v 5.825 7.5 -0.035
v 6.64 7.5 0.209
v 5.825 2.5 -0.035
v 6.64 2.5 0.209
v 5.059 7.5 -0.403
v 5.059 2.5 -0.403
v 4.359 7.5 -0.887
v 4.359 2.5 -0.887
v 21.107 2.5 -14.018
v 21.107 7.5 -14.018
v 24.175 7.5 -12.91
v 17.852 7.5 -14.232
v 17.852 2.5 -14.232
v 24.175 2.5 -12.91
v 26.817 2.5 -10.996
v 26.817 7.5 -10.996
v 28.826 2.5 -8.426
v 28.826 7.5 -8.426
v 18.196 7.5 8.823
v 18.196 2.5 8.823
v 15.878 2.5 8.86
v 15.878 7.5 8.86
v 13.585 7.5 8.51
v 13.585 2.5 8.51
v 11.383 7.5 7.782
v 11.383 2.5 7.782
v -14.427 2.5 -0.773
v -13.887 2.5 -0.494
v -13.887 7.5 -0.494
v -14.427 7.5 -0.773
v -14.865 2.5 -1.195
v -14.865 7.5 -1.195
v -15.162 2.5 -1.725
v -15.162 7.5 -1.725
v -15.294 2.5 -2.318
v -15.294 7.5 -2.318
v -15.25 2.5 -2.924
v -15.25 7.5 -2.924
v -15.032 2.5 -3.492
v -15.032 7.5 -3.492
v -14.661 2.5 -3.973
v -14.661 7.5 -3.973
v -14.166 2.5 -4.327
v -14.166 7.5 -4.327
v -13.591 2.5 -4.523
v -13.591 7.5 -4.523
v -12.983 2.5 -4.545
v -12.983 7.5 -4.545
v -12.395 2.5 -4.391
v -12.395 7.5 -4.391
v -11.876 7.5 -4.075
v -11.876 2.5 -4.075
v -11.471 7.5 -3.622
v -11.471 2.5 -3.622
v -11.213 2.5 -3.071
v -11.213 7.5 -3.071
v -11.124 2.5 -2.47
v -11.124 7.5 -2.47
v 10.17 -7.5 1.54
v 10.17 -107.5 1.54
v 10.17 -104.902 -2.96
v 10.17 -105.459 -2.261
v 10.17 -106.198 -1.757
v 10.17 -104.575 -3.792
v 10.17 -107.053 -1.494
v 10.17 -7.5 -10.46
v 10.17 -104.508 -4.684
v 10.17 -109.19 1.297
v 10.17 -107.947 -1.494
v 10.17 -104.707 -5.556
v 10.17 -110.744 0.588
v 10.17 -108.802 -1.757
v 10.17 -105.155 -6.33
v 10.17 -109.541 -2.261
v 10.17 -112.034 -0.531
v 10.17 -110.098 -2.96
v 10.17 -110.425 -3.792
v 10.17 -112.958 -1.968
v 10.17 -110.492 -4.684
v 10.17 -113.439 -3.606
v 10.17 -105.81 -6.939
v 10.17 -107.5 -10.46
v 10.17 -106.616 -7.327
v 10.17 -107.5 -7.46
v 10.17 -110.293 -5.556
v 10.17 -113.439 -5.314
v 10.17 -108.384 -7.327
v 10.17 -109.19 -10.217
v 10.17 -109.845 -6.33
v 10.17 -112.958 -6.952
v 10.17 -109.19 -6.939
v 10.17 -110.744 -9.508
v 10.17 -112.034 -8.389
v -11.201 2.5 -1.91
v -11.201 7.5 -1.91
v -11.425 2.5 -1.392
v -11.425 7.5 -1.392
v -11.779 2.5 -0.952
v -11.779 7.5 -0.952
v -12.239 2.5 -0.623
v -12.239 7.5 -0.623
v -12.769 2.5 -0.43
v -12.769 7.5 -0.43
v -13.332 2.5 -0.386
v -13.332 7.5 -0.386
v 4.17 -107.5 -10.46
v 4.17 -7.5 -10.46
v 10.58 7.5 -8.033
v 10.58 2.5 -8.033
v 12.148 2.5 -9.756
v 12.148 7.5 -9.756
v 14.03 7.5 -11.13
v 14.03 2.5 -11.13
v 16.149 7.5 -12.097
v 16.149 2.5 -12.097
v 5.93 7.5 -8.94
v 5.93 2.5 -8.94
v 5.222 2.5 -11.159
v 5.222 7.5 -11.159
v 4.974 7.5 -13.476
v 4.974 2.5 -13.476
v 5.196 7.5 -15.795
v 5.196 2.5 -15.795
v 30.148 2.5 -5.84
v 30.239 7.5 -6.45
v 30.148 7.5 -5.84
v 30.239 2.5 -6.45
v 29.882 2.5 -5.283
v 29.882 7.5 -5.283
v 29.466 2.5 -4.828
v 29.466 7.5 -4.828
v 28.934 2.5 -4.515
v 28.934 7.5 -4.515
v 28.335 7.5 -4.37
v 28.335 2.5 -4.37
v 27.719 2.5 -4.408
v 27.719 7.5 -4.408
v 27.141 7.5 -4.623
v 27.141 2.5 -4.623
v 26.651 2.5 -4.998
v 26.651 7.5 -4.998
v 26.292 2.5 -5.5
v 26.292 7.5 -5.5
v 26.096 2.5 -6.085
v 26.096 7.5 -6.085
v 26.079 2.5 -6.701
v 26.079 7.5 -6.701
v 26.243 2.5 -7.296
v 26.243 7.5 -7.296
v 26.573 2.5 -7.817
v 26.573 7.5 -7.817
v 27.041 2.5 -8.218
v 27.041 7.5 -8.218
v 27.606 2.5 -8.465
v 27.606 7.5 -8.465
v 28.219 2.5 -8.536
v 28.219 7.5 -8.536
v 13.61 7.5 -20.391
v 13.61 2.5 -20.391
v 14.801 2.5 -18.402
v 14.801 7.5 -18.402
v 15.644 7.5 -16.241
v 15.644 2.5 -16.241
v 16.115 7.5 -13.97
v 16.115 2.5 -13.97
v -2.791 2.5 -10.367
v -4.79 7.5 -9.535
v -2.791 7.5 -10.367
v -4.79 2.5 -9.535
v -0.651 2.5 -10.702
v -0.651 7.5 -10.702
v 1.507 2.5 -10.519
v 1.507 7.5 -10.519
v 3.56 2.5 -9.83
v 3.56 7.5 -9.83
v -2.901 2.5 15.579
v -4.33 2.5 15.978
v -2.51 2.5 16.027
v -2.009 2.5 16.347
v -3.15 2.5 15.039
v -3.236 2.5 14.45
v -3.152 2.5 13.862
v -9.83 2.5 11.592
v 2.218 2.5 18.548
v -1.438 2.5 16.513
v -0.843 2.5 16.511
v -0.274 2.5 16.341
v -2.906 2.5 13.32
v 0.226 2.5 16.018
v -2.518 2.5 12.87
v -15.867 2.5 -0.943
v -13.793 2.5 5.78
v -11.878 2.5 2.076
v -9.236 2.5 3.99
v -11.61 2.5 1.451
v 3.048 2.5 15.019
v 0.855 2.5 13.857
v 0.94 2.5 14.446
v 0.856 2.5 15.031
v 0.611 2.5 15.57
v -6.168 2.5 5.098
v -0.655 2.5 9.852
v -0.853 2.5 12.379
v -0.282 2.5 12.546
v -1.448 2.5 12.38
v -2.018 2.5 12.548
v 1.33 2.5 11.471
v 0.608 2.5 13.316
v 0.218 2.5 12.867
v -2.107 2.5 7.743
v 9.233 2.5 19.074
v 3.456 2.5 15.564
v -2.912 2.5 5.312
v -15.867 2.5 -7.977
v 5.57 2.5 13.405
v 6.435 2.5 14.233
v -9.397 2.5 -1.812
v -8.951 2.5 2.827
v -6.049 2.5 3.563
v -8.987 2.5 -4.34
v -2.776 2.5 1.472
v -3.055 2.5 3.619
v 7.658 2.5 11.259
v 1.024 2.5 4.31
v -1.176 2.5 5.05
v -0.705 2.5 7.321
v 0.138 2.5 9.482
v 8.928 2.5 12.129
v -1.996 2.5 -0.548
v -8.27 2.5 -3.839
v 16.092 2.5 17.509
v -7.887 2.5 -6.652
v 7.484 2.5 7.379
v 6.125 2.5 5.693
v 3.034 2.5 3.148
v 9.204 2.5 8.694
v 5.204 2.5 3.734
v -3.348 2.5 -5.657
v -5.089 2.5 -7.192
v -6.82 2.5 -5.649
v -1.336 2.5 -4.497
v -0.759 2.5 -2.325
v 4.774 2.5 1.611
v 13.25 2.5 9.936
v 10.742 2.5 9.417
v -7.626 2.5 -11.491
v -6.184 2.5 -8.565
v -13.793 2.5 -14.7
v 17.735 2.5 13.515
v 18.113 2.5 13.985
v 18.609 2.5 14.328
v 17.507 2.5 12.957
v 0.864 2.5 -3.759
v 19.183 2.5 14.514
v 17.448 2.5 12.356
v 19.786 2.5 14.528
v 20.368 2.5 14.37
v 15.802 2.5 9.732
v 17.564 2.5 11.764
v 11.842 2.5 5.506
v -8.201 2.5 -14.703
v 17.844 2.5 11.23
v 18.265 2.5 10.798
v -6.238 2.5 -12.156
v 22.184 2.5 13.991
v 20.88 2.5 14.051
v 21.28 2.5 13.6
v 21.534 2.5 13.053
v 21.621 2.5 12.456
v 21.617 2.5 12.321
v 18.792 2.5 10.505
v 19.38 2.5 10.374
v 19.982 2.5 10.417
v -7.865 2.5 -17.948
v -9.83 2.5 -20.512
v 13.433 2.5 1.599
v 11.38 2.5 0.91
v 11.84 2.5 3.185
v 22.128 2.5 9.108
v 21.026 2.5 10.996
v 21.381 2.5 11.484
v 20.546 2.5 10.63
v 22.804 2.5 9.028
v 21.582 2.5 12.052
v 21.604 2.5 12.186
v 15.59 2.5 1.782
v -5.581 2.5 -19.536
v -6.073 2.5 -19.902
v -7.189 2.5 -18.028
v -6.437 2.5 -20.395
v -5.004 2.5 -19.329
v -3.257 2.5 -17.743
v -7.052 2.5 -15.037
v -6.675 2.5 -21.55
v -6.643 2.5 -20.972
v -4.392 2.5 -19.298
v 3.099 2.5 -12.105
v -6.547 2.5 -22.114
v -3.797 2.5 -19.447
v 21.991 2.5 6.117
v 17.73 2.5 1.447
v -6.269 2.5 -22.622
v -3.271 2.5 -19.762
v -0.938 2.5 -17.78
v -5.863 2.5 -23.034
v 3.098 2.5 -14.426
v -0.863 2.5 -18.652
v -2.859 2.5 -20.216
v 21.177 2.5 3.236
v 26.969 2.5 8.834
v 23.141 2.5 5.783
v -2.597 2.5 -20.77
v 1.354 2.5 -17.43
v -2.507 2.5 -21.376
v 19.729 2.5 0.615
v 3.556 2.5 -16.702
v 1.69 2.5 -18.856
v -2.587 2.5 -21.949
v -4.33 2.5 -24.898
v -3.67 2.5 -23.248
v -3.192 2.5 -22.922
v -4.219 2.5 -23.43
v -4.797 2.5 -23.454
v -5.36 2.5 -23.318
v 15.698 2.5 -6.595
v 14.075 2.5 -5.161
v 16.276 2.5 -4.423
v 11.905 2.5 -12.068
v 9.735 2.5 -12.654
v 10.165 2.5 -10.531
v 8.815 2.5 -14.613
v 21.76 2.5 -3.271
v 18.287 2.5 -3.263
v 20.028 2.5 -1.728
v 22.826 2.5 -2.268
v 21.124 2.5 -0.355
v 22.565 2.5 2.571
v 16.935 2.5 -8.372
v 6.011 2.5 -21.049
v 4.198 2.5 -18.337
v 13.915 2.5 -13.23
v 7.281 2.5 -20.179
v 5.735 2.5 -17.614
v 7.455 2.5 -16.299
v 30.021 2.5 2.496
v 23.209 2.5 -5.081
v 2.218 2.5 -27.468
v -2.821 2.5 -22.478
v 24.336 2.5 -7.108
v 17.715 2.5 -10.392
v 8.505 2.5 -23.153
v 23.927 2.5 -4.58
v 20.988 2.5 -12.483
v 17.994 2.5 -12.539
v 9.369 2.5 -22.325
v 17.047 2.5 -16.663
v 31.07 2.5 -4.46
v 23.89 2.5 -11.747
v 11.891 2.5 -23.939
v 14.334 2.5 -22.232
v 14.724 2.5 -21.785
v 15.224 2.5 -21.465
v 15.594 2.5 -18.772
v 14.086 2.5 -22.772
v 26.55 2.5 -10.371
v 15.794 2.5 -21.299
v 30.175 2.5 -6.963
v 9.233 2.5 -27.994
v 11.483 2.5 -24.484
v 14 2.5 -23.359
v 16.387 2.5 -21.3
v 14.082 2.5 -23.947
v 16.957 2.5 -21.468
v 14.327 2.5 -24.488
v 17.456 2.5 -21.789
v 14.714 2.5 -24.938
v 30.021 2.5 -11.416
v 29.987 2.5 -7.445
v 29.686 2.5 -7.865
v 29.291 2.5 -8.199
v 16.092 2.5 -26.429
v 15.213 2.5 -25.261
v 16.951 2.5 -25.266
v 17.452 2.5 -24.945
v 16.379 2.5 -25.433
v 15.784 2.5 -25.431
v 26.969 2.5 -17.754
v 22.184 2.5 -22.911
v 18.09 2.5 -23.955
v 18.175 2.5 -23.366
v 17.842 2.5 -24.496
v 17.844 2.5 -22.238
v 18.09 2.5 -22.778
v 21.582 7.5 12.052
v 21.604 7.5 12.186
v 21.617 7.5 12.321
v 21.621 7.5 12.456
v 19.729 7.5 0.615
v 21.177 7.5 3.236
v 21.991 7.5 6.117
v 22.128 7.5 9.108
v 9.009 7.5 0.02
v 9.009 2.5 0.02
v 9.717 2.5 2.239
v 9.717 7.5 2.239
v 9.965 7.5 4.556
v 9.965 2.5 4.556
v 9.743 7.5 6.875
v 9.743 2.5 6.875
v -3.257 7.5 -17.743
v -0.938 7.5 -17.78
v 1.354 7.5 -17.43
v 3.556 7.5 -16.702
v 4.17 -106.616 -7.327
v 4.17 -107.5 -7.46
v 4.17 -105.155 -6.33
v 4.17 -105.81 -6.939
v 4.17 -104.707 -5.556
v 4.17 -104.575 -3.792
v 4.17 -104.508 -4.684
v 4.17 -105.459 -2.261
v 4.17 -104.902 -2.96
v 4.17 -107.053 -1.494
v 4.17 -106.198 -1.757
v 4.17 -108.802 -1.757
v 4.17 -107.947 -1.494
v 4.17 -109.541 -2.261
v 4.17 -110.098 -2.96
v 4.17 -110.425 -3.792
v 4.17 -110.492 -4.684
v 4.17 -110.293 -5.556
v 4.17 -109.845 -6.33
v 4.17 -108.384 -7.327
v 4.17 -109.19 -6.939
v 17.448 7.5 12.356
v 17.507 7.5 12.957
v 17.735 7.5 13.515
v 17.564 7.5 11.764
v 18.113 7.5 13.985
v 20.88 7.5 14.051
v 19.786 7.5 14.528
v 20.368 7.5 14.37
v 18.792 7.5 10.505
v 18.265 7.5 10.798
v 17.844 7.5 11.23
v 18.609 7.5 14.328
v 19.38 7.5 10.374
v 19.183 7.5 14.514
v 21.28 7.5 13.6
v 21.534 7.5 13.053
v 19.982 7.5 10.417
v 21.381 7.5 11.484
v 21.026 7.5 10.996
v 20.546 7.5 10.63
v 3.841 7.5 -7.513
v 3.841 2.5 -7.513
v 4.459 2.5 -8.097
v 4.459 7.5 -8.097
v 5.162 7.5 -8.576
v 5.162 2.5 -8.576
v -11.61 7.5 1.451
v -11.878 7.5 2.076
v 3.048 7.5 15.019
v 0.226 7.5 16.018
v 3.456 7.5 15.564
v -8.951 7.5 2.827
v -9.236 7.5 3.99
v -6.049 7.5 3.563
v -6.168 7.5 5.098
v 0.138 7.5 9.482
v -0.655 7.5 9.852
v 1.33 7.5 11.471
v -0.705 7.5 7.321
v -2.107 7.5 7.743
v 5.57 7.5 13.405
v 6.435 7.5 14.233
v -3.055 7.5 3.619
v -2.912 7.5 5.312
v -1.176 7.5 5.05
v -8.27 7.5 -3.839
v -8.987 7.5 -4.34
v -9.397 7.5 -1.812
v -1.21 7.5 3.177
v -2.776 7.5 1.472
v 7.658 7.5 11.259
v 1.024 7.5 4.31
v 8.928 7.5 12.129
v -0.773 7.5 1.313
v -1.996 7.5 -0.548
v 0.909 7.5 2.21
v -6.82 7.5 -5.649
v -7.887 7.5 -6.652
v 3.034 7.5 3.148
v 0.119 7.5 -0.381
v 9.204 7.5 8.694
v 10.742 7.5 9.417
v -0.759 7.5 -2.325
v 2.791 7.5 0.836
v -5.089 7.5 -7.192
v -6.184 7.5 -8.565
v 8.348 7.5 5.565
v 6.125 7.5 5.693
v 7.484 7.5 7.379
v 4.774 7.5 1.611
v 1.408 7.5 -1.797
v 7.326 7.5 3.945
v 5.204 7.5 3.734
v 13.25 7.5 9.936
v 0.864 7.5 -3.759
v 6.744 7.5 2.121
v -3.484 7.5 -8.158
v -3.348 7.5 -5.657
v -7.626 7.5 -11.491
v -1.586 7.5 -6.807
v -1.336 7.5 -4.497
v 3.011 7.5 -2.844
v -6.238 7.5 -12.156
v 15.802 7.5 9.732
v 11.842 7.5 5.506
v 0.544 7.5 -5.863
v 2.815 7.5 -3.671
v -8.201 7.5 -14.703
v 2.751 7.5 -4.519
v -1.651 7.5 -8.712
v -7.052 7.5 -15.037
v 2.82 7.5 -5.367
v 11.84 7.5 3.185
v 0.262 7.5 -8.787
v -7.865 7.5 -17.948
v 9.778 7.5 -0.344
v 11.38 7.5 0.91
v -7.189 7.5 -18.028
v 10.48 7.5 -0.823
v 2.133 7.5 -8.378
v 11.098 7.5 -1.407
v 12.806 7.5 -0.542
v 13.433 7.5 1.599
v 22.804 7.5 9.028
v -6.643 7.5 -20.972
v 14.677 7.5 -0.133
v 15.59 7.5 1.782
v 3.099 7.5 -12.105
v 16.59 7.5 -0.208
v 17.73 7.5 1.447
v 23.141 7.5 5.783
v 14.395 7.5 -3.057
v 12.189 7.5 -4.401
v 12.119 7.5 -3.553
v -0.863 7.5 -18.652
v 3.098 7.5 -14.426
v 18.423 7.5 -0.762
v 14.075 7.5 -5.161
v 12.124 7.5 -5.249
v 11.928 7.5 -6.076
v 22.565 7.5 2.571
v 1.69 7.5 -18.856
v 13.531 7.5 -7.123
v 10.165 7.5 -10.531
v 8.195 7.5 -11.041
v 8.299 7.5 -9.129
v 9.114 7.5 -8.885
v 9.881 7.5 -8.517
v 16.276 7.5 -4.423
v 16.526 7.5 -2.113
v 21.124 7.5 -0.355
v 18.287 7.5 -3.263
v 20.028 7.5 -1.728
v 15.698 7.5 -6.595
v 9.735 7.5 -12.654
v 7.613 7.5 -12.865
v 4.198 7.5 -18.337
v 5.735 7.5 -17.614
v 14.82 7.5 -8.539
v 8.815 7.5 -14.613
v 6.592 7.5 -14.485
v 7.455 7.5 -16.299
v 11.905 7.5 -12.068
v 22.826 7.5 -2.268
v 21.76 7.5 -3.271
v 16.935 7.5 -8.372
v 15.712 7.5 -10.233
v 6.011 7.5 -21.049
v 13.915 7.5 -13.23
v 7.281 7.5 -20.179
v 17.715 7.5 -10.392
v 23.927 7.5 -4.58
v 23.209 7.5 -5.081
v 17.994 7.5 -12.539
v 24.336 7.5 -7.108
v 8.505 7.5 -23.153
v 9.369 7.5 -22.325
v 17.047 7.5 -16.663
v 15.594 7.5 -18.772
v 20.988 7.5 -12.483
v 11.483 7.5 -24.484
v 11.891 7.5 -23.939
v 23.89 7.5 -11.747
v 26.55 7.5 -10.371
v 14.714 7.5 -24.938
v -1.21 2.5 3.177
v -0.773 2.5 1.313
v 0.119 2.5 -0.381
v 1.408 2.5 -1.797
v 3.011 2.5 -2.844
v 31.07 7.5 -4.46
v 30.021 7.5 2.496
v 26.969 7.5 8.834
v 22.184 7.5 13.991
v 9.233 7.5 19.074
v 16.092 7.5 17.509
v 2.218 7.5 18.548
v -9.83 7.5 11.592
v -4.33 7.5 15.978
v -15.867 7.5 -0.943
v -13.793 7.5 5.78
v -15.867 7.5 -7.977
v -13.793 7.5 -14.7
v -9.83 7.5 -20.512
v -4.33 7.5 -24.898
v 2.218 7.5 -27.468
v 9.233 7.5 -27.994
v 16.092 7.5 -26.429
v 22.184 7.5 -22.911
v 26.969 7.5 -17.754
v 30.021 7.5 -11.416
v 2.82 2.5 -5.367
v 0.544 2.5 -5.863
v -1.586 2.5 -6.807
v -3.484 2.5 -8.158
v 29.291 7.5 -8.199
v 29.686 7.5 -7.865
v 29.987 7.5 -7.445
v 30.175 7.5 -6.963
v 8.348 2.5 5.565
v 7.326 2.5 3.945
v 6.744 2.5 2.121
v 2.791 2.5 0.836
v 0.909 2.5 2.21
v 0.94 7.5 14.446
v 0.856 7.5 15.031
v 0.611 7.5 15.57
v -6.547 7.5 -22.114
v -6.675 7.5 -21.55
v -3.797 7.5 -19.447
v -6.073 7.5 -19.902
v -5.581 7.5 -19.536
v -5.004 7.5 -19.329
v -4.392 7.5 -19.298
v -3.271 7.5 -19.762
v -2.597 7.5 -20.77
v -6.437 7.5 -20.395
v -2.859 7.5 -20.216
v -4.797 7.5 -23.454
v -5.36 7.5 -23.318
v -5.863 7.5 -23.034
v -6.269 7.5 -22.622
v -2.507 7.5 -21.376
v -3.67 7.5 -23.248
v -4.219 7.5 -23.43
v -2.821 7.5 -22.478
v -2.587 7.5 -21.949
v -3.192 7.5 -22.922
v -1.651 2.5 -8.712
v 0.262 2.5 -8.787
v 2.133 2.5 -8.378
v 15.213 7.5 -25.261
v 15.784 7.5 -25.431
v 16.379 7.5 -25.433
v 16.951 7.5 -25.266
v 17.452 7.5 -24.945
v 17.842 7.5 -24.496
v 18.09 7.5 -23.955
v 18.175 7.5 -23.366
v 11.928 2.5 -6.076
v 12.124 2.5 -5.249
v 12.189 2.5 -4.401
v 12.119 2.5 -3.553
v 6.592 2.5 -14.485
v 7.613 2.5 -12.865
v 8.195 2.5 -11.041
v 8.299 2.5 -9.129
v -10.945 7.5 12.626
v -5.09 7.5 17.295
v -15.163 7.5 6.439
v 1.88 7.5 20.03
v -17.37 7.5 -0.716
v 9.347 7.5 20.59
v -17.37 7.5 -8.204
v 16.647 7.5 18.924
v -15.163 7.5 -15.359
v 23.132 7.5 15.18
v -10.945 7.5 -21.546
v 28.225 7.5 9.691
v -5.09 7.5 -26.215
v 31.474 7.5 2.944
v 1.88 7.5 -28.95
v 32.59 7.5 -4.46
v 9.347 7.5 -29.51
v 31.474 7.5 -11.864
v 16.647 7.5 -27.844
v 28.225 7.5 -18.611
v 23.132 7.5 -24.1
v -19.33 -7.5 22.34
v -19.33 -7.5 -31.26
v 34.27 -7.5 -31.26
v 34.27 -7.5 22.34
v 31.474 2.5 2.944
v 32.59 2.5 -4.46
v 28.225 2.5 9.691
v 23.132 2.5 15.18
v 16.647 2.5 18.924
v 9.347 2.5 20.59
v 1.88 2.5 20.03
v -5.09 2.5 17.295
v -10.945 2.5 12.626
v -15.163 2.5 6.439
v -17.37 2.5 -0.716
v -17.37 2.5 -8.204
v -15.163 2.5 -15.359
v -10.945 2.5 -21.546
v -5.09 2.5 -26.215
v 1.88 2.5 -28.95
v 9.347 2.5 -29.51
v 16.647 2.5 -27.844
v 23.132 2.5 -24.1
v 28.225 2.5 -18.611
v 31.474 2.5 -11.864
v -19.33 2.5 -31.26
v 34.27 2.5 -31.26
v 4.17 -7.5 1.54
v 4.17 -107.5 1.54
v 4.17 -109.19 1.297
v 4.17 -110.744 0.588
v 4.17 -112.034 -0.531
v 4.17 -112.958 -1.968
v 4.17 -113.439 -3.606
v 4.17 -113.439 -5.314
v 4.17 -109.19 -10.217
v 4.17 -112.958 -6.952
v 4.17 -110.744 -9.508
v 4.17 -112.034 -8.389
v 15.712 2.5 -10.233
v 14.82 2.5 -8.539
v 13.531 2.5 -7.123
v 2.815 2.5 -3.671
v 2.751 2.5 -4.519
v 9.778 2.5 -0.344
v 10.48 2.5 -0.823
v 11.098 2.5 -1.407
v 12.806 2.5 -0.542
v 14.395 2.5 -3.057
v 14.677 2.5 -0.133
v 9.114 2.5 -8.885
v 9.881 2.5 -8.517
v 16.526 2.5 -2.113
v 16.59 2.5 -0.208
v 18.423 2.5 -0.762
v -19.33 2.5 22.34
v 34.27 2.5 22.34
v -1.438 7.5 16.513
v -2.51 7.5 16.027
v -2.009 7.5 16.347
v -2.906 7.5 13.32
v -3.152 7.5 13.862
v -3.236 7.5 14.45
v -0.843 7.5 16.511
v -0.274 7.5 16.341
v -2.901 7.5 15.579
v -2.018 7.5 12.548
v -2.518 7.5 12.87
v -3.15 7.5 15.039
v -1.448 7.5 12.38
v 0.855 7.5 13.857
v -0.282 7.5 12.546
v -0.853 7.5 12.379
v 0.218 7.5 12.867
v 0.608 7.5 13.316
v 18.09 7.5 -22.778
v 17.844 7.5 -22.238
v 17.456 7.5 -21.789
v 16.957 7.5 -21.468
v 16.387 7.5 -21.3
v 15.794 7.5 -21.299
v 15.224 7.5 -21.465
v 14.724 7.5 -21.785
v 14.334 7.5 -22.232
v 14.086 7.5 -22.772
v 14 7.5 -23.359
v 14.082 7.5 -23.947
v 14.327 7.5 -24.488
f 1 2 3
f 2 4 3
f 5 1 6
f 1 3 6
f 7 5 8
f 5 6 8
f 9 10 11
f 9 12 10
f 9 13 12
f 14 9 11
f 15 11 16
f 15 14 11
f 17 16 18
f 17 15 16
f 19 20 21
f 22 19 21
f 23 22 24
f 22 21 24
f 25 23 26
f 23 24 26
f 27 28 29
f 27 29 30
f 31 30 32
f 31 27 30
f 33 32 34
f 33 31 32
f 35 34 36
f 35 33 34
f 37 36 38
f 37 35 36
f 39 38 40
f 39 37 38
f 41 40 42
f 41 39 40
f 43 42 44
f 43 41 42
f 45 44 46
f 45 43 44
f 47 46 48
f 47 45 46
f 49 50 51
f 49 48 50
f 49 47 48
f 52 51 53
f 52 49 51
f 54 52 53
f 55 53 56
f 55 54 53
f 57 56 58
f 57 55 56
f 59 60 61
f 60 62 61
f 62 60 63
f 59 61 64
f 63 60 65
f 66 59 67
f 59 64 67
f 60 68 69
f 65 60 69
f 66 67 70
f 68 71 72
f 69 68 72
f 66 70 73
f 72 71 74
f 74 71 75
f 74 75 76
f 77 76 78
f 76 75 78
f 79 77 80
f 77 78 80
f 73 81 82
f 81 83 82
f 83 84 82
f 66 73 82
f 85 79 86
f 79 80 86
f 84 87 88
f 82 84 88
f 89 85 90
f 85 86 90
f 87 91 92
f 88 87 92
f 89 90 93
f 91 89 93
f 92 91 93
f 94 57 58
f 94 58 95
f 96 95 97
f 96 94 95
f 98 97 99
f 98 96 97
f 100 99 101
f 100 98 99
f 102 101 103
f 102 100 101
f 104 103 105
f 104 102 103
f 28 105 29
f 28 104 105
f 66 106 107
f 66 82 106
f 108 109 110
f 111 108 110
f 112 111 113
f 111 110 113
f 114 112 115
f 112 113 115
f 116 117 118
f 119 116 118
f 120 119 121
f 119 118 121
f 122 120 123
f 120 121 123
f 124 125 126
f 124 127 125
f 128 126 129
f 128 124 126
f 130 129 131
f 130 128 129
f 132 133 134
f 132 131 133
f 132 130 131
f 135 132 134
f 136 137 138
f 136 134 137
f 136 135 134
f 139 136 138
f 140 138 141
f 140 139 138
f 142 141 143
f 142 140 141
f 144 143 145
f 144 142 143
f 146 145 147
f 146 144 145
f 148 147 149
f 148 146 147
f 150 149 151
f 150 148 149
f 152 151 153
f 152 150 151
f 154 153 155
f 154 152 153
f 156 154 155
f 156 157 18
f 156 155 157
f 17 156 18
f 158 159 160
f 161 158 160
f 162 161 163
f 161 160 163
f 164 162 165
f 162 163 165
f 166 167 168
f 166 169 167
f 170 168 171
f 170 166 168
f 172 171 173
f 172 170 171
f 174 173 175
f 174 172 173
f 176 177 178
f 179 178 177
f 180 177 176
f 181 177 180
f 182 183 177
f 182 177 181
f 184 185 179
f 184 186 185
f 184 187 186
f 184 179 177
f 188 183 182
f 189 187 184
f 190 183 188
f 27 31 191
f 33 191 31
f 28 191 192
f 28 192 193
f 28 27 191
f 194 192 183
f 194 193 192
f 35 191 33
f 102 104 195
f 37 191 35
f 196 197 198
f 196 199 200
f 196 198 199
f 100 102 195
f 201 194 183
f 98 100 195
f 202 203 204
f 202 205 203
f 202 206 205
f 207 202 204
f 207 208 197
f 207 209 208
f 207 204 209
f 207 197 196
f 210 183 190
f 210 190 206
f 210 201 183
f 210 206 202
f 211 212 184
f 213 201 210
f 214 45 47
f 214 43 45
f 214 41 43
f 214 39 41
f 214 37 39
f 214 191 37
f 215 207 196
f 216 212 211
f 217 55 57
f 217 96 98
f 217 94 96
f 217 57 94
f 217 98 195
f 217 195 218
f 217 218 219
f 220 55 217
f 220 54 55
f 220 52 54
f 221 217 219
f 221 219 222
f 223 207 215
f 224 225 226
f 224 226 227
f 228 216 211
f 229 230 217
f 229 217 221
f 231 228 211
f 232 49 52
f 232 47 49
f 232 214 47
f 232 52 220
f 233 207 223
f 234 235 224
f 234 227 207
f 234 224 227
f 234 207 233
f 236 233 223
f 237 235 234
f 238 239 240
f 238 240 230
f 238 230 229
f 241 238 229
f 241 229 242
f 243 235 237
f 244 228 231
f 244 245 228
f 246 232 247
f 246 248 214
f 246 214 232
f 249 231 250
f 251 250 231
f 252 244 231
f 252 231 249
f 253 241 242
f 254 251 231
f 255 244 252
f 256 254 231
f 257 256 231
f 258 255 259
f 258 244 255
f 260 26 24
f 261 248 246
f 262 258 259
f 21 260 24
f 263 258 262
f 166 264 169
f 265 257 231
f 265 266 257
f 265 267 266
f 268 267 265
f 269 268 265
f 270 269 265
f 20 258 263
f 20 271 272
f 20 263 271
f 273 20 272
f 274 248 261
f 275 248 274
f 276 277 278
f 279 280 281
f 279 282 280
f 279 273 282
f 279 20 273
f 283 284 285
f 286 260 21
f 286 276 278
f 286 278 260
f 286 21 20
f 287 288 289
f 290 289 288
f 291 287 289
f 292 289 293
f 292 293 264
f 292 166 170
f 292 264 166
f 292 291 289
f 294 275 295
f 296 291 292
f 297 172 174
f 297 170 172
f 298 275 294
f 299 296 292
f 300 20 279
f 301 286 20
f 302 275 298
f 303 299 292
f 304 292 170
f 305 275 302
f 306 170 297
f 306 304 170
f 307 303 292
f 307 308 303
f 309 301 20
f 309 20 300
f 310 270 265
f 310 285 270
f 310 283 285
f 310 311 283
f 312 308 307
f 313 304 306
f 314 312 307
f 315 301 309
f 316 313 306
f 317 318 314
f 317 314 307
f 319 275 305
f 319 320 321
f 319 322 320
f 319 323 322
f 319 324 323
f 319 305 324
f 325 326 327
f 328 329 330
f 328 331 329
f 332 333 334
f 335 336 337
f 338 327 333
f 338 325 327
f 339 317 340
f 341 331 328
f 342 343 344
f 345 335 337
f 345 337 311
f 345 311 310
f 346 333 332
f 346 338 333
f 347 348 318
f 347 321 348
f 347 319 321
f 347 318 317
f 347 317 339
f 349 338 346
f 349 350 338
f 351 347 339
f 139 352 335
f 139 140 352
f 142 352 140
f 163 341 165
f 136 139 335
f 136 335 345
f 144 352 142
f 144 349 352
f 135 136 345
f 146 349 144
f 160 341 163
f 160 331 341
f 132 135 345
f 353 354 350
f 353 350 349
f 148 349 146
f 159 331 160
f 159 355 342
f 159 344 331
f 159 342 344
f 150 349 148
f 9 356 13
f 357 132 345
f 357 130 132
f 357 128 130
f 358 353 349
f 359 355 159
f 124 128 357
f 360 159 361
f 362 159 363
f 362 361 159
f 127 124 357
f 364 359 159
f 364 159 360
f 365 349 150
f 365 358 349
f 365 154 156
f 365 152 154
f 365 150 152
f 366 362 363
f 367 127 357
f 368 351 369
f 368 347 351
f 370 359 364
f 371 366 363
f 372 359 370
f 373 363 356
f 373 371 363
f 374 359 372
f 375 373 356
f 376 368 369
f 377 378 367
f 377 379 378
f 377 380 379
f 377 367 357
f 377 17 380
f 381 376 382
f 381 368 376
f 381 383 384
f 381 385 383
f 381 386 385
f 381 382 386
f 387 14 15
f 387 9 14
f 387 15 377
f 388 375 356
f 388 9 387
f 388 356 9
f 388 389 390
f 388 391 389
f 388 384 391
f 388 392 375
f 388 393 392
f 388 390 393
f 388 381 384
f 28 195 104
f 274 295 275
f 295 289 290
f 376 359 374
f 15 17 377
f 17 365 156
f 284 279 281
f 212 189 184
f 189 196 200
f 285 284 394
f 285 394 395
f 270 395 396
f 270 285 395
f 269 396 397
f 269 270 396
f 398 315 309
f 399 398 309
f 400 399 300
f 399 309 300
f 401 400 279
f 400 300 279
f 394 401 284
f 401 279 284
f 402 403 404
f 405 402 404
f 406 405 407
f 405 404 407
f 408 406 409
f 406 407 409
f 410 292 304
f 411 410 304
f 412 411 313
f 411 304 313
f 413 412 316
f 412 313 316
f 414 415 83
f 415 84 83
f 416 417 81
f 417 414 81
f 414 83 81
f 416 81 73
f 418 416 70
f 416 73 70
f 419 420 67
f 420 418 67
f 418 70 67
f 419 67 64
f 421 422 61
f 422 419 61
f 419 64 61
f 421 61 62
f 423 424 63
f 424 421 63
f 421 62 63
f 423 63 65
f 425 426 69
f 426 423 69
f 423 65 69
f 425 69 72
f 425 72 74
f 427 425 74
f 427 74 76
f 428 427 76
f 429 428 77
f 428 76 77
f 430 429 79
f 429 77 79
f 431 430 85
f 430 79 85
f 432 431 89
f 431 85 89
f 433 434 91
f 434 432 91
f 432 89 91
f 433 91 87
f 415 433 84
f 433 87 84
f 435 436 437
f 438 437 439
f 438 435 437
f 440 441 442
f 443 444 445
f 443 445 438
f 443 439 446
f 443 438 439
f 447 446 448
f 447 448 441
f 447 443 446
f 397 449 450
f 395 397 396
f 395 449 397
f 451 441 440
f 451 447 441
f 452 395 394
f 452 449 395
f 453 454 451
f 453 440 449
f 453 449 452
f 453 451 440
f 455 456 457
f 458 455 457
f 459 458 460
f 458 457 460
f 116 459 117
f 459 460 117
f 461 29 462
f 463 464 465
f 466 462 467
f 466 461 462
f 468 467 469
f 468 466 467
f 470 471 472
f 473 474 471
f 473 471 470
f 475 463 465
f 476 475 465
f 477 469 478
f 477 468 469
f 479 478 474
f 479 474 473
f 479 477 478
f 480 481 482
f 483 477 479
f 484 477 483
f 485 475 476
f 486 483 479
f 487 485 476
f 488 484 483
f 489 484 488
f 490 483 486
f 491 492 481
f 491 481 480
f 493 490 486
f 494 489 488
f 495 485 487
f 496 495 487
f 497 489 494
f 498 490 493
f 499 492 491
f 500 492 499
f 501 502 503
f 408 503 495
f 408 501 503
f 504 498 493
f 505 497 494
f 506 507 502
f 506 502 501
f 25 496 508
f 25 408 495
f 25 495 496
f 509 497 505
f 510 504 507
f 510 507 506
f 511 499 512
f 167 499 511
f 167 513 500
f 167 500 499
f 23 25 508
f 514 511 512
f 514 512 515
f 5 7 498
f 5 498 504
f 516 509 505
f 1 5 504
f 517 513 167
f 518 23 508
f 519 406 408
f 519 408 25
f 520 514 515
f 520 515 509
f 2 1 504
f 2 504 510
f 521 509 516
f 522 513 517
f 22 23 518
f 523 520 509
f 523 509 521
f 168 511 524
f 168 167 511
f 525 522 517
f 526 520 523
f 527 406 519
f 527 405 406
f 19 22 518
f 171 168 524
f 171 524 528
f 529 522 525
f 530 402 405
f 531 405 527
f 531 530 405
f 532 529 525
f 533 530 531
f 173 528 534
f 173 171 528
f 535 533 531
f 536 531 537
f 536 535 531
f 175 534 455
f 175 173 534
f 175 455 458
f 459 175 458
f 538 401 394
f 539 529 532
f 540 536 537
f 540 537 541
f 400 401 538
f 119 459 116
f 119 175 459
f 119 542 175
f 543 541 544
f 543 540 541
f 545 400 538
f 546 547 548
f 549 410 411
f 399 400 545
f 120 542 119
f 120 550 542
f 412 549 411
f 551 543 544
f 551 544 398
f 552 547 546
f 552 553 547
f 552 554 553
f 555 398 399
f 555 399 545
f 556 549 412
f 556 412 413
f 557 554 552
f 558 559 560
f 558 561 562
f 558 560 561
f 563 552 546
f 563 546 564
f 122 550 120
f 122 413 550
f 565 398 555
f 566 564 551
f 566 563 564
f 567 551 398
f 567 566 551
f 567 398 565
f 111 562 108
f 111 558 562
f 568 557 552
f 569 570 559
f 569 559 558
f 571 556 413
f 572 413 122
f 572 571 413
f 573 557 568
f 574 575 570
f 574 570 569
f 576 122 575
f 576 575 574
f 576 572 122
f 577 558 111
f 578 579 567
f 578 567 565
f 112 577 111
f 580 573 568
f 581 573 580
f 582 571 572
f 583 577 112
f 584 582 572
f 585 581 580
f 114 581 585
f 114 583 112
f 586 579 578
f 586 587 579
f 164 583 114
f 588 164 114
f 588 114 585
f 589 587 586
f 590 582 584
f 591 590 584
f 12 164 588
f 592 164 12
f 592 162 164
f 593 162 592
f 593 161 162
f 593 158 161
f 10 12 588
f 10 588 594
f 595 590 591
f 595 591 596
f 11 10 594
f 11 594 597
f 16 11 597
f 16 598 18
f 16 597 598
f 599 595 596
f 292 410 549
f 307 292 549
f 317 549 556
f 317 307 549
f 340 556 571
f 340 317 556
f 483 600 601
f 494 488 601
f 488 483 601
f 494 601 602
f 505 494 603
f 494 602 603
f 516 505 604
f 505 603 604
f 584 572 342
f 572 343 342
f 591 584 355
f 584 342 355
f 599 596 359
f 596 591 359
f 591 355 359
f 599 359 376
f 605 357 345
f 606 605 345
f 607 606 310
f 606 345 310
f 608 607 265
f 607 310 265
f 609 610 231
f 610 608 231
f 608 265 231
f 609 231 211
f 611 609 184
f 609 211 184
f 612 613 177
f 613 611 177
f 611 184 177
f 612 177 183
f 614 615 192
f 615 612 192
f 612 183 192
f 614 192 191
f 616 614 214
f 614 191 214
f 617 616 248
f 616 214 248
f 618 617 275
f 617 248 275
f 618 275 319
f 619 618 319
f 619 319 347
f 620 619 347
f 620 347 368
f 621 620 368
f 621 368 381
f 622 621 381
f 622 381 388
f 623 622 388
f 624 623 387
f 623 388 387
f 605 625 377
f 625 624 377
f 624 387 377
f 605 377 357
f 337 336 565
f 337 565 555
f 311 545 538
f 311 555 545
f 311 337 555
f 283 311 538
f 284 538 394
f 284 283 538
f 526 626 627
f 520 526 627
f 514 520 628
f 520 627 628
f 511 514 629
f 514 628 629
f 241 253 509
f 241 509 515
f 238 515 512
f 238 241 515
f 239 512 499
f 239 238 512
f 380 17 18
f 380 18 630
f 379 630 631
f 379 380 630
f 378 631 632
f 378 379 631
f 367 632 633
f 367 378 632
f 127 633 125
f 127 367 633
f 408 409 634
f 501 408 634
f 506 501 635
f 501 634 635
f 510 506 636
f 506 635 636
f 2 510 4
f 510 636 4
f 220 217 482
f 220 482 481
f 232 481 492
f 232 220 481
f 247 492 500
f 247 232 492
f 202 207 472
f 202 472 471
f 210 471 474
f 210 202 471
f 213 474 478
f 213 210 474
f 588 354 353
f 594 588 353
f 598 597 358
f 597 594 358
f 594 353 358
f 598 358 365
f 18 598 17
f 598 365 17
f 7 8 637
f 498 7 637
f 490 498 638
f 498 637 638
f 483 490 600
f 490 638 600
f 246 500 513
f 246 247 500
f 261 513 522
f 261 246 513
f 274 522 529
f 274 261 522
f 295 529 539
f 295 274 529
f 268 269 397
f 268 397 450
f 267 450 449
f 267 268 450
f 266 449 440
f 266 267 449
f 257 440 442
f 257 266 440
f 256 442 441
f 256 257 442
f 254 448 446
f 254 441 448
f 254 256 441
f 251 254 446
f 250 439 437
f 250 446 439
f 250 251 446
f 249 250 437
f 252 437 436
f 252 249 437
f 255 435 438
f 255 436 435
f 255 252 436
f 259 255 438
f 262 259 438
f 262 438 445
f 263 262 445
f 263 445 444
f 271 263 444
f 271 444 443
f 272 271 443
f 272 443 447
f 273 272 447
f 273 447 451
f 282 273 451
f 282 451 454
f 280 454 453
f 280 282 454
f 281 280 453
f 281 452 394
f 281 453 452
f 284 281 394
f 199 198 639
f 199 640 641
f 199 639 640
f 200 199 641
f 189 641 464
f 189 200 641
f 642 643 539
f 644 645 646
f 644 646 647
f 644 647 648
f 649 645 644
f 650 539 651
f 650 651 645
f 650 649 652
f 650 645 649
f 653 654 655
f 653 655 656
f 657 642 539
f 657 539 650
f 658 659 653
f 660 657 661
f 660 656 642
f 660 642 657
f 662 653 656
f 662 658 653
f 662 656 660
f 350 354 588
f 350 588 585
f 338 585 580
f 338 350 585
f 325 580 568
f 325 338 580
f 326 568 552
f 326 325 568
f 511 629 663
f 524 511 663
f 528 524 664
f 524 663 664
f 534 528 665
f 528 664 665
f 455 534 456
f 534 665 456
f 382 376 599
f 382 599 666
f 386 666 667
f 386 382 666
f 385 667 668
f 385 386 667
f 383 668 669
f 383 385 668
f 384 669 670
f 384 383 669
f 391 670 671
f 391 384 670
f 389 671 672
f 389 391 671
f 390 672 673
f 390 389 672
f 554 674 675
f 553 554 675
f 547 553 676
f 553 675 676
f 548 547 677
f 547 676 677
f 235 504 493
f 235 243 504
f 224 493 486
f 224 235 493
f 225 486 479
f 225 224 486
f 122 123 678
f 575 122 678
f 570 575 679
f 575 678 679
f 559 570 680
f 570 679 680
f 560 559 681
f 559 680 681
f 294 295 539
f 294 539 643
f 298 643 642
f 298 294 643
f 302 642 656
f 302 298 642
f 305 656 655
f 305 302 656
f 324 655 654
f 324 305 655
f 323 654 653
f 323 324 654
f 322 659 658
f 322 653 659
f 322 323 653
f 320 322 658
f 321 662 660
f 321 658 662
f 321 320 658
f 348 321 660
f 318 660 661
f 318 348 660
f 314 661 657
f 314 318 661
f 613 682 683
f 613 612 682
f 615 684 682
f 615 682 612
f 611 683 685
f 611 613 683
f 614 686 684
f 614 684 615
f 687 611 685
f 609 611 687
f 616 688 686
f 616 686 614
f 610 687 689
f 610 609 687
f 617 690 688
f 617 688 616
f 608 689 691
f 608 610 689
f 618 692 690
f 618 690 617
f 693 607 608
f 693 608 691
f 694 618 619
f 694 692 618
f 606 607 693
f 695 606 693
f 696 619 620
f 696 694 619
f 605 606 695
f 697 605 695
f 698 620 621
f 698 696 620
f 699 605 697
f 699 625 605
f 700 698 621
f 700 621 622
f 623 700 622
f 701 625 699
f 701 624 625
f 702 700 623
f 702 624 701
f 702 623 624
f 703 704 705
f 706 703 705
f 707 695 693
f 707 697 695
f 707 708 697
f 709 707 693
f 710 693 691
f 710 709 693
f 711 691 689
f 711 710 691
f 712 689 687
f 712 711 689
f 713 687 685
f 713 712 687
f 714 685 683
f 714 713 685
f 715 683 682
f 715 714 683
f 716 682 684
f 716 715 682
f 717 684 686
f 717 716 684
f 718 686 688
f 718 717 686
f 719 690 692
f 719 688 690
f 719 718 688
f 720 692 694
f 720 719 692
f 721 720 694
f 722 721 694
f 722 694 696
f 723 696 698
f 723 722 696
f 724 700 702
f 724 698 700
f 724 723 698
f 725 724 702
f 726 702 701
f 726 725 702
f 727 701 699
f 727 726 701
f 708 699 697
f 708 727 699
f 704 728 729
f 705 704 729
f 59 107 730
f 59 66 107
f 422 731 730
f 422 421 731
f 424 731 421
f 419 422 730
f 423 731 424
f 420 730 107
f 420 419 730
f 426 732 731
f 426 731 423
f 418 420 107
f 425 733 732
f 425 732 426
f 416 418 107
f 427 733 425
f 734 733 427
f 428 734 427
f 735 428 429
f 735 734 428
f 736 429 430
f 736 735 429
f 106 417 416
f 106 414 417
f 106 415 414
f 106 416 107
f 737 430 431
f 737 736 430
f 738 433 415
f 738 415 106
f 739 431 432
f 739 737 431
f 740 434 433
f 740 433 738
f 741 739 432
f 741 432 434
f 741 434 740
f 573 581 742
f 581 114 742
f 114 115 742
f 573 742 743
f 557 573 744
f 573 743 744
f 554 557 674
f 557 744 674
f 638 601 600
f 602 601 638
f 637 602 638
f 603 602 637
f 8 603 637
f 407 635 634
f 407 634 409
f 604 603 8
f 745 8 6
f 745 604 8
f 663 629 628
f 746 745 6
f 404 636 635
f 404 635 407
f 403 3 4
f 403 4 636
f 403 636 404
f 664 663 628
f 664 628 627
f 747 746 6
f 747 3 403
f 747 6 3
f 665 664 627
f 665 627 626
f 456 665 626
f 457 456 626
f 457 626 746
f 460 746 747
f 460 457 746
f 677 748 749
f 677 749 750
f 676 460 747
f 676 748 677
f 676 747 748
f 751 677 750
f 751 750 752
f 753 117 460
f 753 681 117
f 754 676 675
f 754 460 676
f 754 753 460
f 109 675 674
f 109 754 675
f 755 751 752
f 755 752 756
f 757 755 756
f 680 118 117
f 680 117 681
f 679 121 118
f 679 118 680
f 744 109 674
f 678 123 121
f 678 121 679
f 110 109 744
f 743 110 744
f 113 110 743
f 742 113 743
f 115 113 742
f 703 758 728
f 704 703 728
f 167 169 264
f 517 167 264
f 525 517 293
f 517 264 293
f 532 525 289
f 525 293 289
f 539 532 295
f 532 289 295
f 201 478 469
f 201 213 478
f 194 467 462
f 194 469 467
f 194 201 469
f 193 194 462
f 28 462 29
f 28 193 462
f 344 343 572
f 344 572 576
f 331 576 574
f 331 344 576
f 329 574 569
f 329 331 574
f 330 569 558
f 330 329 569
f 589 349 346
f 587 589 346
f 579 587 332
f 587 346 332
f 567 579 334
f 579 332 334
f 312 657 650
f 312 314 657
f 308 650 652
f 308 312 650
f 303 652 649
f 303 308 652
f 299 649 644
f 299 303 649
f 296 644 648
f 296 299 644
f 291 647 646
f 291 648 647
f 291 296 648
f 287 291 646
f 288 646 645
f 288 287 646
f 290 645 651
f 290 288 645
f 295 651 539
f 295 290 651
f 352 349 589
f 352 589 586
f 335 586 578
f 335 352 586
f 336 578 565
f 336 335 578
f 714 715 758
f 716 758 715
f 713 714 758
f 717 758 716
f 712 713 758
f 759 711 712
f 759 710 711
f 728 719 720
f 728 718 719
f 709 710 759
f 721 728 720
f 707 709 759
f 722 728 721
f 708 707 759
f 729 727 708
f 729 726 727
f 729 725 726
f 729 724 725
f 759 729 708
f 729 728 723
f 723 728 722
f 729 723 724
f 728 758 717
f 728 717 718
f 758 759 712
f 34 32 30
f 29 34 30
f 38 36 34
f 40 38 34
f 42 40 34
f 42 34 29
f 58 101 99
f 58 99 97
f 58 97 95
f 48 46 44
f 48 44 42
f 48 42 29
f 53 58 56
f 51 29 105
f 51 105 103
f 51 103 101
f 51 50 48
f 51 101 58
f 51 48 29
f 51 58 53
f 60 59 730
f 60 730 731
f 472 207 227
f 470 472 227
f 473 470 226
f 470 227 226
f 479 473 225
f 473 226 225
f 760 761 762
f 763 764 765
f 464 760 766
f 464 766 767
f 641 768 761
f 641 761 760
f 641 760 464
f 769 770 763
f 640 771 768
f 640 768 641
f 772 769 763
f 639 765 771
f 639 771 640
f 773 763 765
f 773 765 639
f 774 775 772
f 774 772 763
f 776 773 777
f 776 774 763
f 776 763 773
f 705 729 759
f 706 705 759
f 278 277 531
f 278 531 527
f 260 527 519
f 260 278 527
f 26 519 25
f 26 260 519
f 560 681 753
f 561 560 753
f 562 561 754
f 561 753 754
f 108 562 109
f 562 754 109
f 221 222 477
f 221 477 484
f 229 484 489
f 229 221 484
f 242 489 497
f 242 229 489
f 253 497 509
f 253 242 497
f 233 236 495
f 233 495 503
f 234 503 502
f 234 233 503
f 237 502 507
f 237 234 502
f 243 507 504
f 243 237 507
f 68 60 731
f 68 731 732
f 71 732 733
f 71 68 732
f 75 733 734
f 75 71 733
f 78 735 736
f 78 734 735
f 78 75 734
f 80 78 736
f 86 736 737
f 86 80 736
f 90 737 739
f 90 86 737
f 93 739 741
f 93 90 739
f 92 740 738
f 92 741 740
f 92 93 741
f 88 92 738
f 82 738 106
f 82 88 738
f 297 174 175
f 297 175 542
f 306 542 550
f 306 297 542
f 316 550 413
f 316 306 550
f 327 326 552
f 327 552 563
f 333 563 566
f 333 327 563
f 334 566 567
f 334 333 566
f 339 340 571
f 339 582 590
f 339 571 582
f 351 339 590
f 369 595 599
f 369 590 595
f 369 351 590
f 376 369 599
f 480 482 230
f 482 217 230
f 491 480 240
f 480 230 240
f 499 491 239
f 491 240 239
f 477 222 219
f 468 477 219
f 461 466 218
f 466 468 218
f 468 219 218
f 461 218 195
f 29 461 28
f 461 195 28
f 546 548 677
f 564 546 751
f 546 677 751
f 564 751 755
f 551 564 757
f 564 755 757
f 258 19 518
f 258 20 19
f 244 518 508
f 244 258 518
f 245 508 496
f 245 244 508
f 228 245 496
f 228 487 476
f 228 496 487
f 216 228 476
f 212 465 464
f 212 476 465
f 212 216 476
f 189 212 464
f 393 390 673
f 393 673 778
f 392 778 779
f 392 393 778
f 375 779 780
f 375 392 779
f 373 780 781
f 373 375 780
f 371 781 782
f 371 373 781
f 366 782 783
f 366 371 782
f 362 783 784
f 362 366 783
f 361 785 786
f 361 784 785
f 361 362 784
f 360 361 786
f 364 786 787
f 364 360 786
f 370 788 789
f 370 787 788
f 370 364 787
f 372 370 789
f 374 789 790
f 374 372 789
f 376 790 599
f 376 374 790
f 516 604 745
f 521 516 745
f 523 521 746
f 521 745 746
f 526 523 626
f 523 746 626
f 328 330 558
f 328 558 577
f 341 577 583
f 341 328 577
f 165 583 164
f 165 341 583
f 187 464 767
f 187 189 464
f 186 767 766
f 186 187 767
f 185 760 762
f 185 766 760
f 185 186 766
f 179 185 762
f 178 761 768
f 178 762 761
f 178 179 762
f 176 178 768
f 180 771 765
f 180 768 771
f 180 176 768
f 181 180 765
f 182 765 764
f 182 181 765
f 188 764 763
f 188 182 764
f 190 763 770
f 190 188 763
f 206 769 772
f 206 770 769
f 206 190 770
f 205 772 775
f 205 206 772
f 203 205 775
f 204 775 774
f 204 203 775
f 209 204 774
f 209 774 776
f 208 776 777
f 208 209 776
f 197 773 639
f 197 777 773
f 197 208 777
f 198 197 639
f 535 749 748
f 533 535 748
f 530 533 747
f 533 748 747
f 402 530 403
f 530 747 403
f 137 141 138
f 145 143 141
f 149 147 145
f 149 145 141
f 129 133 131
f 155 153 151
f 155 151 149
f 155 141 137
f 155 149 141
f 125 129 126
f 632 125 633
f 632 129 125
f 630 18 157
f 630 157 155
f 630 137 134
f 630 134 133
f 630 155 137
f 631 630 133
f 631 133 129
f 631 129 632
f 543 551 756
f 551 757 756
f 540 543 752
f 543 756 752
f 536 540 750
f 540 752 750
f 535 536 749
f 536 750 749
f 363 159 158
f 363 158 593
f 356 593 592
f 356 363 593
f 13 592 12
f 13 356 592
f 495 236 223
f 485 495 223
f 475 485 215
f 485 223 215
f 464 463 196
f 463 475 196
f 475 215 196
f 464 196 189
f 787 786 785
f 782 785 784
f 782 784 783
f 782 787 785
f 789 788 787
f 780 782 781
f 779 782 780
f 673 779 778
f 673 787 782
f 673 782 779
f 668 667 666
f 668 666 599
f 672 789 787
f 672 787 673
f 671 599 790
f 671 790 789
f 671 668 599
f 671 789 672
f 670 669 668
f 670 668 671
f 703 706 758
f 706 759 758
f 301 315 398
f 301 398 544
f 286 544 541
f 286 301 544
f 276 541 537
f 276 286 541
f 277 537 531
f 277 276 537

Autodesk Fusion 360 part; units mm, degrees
sketch "Sketch1" plane through (0, 0, 0) normal (0, 1, 0) x (1, 0, 0)
  arc A0 (0.3848, -1.12) -> (0.9072, -0.7632) centre (-0.0957, 0.1445) ccw
  arc A1 (3.1397, -0.683) -> (4.2167, 0.662) centre (1.059, 2.0869) ccw
  arc A2 (0.9072, -0.7632) -> (2.7383, -0.9246) centre (1.9676, 0.8001) ccw
  arc A3 (3.0458, -0.7511) -> (3.0474, -0.7499) centre (2.7604, -0.3405) ccw
  arc A4 (-1.811, -5.1195) -> (0.4336, -3.2886) centre (-2.5419, -1.932) ccw
  arc A5 (3.5281, -4.1281) -> (3.0649, -1.2688) centre (0.4022, -3.1674) ccw
  arc A6 (1.1624, -0.2268) -> (1.1146, 0.4041) centre (-0.173, -0.0107) ccw
  arc A7 (1.1146, 0.4041) -> (2.1699, 1.9092) centre (0.2909, 2.1041) ccw
  arc A8 (5.3391, 0.9914) -> (2.6312, 2.0198) centre (2.9441, -1.2354) ccw
  arc A9 (0.7776, 0.8933) -> (0.2074, 1.1673) centre (-0.0773, -0.1552) ccw
  arc A10 (0.2074, 1.1673) -> (-0.5684, 2.8338) centre (-1.6767, 1.304) ccw
  arc A11 (-0.9784, 3.0605) -> (-2.6817, 3.3207) centre (-2.3368, -0.1263) ccw
  arc A12 (1.811, 5.1195) -> (-0.4336, 3.2886) centre (2.5419, 1.932) ccw
  arc A13 (-0.3848, 1.12) -> (-0.9072, 0.7632) centre (0.0957, -0.1445) ccw
  arc A14 (-0.9072, 0.7632) -> (-2.7383, 0.9246) centre (-1.9676, -0.8001) ccw
  arc A15 (-3.1397, 0.683) -> (-4.2167, -0.662) centre (-1.059, -2.0869) ccw
  arc A16 (-3.5281, 4.1281) -> (-3.0649, 1.2688) centre (-0.4022, 3.1674) ccw
  arc A17 (-1.1624, 0.2268) -> (-1.1146, -0.4041) centre (0.173, 0.0107) ccw
  arc A18 (-1.1146, -0.4041) -> (-2.1699, -1.9092) centre (-0.2909, -2.1041) ccw
  arc A19 (-2.1613, -2.3776) -> (-1.535, -3.9828) centre (1.2778, -1.9605) ccw
  arc A20 (-5.3391, -0.9914) -> (-2.6312, -2.0198) centre (-2.9441, 1.2354) ccw
  arc A21 (-0.7776, -0.8933) -> (-0.2074, -1.1673) centre (0.0773, 0.1552) ccw
  arc A22 (-0.2074, -1.1673) -> (0.5684, -2.8338) centre (1.6767, -1.304) ccw
  arc A23 (0.9784, -3.0605) -> (2.6817, -3.3207) centre (2.3368, 0.1263) ccw
  arc A24 (0.5684, -2.8338) -> (0.3848, -1.12) centre (-2.2605, -2.2702) ccw
  arc A25 (-2.1699, -1.9092) -> (-0.7776, -0.8933) centre (-3.0963, 0.8225) ccw
  arc A26 (-2.7383, 0.9246) -> (-1.1624, 0.2268) centre (-0.8358, 3.0927) ccw
  arc A27 (-0.5684, 2.8338) -> (-0.3848, 1.12) centre (2.2605, 2.2702) ccw
  arc A28 (2.1699, 1.9092) -> (0.7776, 0.8933) centre (3.0963, -0.8225) ccw
  arc A29 (2.7383, -0.9246) -> (1.1624, -0.2268) centre (0.8358, -3.0927) ccw
  line L0 (6.7, -6.7) -> (-6.7, -6.7)
  line L1 (-6.7, -6.7) -> (-6.7, 6.7)
  line L2 (-6.7, 6.7) -> (6.7, 6.7)
  line L3 (6.7, 6.7) -> (6.7, -6.7)
  arc A30 (-0.6739, -1.5178) -> (0.4336, -3.2886) centre (1.5858, -1.3364) ccw
  arc A31 (0.818, -3.4693) -> (2.6817, -3.3207) centre (1.5858, -1.3364) ccw
  arc A32 (-1.811, -5.1195) -> (0.818, -3.4693) centre (-1.8093, -2.2029) ccw
  arc A33 (0.9784, -3.0605) -> (0.9775, -1.3425) centre (-1.8093, -2.2029) ccw
  arc A34 (0.9775, -1.3425) -> (3.0649, -1.2688) centre (1.9502, 0.7051) ccw
  arc A35 (3.4135, -1.0262) -> (4.2167, 0.662) centre (1.9502, 0.7051) ccw
  arc A36 (3.1397, -0.683) -> (1.6513, 0.1753) centre (1.0032, -2.6683) ccw
  arc A37 (3.5281, -4.1281) -> (3.4135, -1.0262) centre (1.0032, -2.6683) ccw
  arc A38 (1.6513, 0.1753) -> (2.6312, 2.0198) centre (0.3645, 2.0415) ccw
  arc A39 (2.5955, 2.4431) -> (1.535, 3.9828) centre (0.3645, 2.0415) ccw
  arc A40 (2.1613, 2.3776) -> (0.6739, 1.5178) centre (2.8124, -0.4654) ccw
  arc A41 (5.3391, 0.9914) -> (2.5955, 2.4431) centre (2.8124, -0.4654) ccw
  arc A42 (0.6739, 1.5178) -> (-0.4336, 3.2886) centre (-1.5858, 1.3364) ccw
  arc A43 (-0.818, 3.4693) -> (-2.6817, 3.3207) centre (-1.5858, 1.3364) ccw
  arc A44 (-0.9784, 3.0605) -> (-0.9775, 1.3425) centre (1.8093, 2.2029) ccw
  arc A45 (1.811, 5.1195) -> (-0.818, 3.4693) centre (1.8093, 2.2029) ccw
  arc A46 (-0.9775, 1.3425) -> (-3.0649, 1.2688) centre (-1.9502, -0.7051) ccw
  arc A47 (-3.4135, 1.0262) -> (-4.2167, -0.662) centre (-1.9502, -0.7051) ccw
  arc A48 (-3.1397, 0.683) -> (-1.6513, -0.1753) centre (-1.0032, 2.6683) ccw
  arc A49 (-3.5281, 4.1281) -> (-3.4135, 1.0262) centre (-1.0032, 2.6683) ccw
  arc A50 (-1.6513, -0.1753) -> (-2.6312, -2.0198) centre (-0.3645, -2.0415) ccw
  arc A51 (-2.5955, -2.4431) -> (-1.535, -3.9828) centre (-0.3645, -2.0415) ccw
  arc A52 (-2.1613, -2.3776) -> (-0.6739, -1.5178) centre (-2.8124, 0.4654) ccw
  arc A53 (-5.3391, -0.9914) -> (-2.5955, -2.4431) centre (-2.8124, 0.4654) ccw
  arc A54 (2.1613, 2.3776) -> (1.535, 3.9828) centre (-1.2778, 1.9605) ccw
  circle A55 centre (3.016, -4.229) radius 0.5219
  circle A56 centre (5.1704, 0.4975) radius 0.5219
  circle A57 centre (2.1544, 4.7264) radius 0.5219
  circle A58 centre (-3.016, 4.229) radius 0.5219
  circle A59 centre (-5.1704, -0.4975) radius 0.5219
  circle A60 centre (-2.1544, -4.7264) radius 0.5219
  circle A61 centre (0, 0) radius 5.9
  circle A62 centre (0, 0) radius 6.28
  dimension "d1" = 0.5
  dimension "d9" = 13.4
  dimension "d10" = 13.4
  dimension "d15" = 6.7
  dimension "d23" = 360
  dimension "d25" = 11.8
  dimension "d26" = 12.56
  dimension "d27" = 6.7
extrude "Extrude1" add sketch "Sketch1" along normal blind 1.25 contours A0 A1 A2 A3 A4 A5 A6 A7 A8 A9 A10 A11 A12 A13 A14 A15 A16 A17 A18 A19 A20 A21 A22 A23 A24 A25 A26 A27 A28 A29 A30 A31 A32 A33 A34 A35 A36 A37 A38 A39 A40 A41 A42 A43 A44 A45 A46 A47 A48 A49 A50 A51 A52 A53 A54 | A3 A29 A36 | A55 | A60 | A59 | A58 | A57 | A56 | A62 makes body 1 at (-2.3208, 0, 2.1022) makes body 2 at (6.2722, 0.8333, 0.313)
extrude "Extrude2" add sketch "Sketch1" against normal blind 2.5 contours A0 A2 A3 A6 A7 A9 A10 A13 A14 A17 A18 A21 A22 A24 A25 A26 A27 A28 A29 | A0 A1 A2 A3 A4 A5 A6 A7 A8 A9 A10 A11 A12 A13 A14 A15 A16 A17 A18 A19 A20 A21 A22 A23 A24 A25 A26 A27 A28 A29 A30 A31 A32 A33 A34 A35 A36 A37 A38 A39 A40 A41 A42 A43 A44 A45 A46 A47 A48 A49 A50 A51 A52 A53 A54 | A3 A29 A36 | A3 A29 | A3 A36 | A55 | A60 | A59 | A58 | A57 | A56 | L0 L1 L2 L3 | A61 | A62 bodies 2 1
scale "Scale1" factor 2 about (-6.7, -2.5, 6.7) bodies 2
scale "Scale2" factor 2 about (5.9304, 2.5, -8.94) bodies 2
sketch "Sketch2" plane through (0, 2.5, 0) normal (0, 1, 0) x (-1, 0, 0)
  arc A0 (-18.4229, -0.7616) -> (-12.1191, -3.5529) centre (-10.8129, 7.911) ccw
  arc A1 (-12.1191, -3.5529) -> (-11.928, -6.0762) centre (-6.7775, -4.4173) ccw
  arc A2 (-11.928, -6.0762) -> (-16.1492, -12.0967) centre (-8.6334, -12.8762) ccw
  arc A3 (-16.1492, -12.0967) -> (-10.5798, -8.033) centre (-19.8548, -1.1699) ccw
  arc A4 (-10.5798, -8.033) -> (-8.2991, -9.1292) centre (-7.1605, -3.8393) ccw
  arc A5 (-8.2991, -9.1292) -> (-5.1958, -15.795) centre (-0.7628, -9.676) ccw
  arc A6 (-5.1958, -15.795) -> (-5.9304, -8.94) centre (-16.5115, -13.5408) ccw
  arc A7 (-5.9304, -8.94) -> (-3.8407, -7.5129) centre (-7.8526, -3.8819) ccw
  arc A8 (-3.8407, -7.5129) -> (3.4837, -8.1583) centre (0.401, -1.2597) ccw
  arc A9 (3.4837, -8.1583) -> (-2.8202, -5.367) centre (-4.1263, -16.8309) ccw
  arc A10 (-2.8202, -5.367) -> (-3.0112, -2.8437) centre (-8.1617, -4.5026) ccw
  arc A11 (-3.0112, -2.8437) -> (1.2099, 3.1767) centre (-6.3058, 3.9563) ccw
  arc A12 (1.2099, 3.1767) -> (-4.3594, -0.8869) centre (4.9156, -7.7501) ccw
  arc A13 (-4.3594, -0.8869) -> (-6.6401, 0.2092) centre (-7.7787, -5.0806) ccw
  arc A14 (-6.6401, 0.2092) -> (-9.7434, 6.8751) centre (-14.1764, 0.756) ccw
  arc A15 (-9.7434, 6.8751) -> (-9.0088, 0.0201) centre (1.5723, 4.6208) ccw
  arc A16 (-9.0088, 0.0201) -> (-11.0985, -1.407) centre (-7.0866, -5.038) ccw
  arc A17 (-11.0985, -1.407) -> (-18.4229, -0.7616) centre (-15.3402, -7.6602) ccw
sketch "Sketch3" plane through (0, -7.5, 0) normal (0, -1, 0) x (1, 0, 0)
  line L0 (-19.3304, -31.26) -> (34.2696, -31.26)
  line L1 (34.2696, -31.26) -> (34.2696, 22.34)
  line L2 (34.2696, 22.34) -> (-19.3304, 22.34)
  line L3 (-19.3304, 22.34) -> (-19.3304, -31.26)
  line L4 (10.4696, 10.54) -> (4.4696, 10.54)
  line L5 (4.4696, 10.54) -> (4.4696, -19.46)
  line L6 (4.4696, -19.46) -> (10.4696, -19.46)
  line L7 (10.4696, -19.46) -> (10.4696, 10.54)
  point P0 (7.4696, -4.46)
  dimension "d28" = 6
  dimension "d29" = 30
ref_plane "WorkPlane1" through (7.1696, -2.5, -4.46) normal (-1, 0, 0) x (0, 0, -1)
sketch "Sketch4" plane through (7.1696, -2.5, -4.46) normal (-1, 0, 0) x (0, 0, -1)
  line L0 (-26.8, -5) -> (26.8, -5)
  line L1 (26.8, -5) -> (26.8, 5)
  line L2 (26.8, 5) -> (-26.8, 5)
  line L3 (-26.8, 5) -> (-26.8, -5)
  line L4 (0, 5) -> (-6, 5)
  line L5 (-6, 5) -> (-6, 105)
  line L6 (6, 105) -> (6, 5)
  circle A0 centre (0, 105) radius 3
  arc A1 (6, 105) -> (-6, 105) centre (0, 105) ccw
  dimension "d31" = 6
  dimension "d32" = 100
  dimension "d33" = 12
  dimension "d34" = 6
extrude "Extrude3" add sketch "Sketch4" along normal mid plane 6 separate body contours L2 L4 L5 L6 A1 makes body 3
